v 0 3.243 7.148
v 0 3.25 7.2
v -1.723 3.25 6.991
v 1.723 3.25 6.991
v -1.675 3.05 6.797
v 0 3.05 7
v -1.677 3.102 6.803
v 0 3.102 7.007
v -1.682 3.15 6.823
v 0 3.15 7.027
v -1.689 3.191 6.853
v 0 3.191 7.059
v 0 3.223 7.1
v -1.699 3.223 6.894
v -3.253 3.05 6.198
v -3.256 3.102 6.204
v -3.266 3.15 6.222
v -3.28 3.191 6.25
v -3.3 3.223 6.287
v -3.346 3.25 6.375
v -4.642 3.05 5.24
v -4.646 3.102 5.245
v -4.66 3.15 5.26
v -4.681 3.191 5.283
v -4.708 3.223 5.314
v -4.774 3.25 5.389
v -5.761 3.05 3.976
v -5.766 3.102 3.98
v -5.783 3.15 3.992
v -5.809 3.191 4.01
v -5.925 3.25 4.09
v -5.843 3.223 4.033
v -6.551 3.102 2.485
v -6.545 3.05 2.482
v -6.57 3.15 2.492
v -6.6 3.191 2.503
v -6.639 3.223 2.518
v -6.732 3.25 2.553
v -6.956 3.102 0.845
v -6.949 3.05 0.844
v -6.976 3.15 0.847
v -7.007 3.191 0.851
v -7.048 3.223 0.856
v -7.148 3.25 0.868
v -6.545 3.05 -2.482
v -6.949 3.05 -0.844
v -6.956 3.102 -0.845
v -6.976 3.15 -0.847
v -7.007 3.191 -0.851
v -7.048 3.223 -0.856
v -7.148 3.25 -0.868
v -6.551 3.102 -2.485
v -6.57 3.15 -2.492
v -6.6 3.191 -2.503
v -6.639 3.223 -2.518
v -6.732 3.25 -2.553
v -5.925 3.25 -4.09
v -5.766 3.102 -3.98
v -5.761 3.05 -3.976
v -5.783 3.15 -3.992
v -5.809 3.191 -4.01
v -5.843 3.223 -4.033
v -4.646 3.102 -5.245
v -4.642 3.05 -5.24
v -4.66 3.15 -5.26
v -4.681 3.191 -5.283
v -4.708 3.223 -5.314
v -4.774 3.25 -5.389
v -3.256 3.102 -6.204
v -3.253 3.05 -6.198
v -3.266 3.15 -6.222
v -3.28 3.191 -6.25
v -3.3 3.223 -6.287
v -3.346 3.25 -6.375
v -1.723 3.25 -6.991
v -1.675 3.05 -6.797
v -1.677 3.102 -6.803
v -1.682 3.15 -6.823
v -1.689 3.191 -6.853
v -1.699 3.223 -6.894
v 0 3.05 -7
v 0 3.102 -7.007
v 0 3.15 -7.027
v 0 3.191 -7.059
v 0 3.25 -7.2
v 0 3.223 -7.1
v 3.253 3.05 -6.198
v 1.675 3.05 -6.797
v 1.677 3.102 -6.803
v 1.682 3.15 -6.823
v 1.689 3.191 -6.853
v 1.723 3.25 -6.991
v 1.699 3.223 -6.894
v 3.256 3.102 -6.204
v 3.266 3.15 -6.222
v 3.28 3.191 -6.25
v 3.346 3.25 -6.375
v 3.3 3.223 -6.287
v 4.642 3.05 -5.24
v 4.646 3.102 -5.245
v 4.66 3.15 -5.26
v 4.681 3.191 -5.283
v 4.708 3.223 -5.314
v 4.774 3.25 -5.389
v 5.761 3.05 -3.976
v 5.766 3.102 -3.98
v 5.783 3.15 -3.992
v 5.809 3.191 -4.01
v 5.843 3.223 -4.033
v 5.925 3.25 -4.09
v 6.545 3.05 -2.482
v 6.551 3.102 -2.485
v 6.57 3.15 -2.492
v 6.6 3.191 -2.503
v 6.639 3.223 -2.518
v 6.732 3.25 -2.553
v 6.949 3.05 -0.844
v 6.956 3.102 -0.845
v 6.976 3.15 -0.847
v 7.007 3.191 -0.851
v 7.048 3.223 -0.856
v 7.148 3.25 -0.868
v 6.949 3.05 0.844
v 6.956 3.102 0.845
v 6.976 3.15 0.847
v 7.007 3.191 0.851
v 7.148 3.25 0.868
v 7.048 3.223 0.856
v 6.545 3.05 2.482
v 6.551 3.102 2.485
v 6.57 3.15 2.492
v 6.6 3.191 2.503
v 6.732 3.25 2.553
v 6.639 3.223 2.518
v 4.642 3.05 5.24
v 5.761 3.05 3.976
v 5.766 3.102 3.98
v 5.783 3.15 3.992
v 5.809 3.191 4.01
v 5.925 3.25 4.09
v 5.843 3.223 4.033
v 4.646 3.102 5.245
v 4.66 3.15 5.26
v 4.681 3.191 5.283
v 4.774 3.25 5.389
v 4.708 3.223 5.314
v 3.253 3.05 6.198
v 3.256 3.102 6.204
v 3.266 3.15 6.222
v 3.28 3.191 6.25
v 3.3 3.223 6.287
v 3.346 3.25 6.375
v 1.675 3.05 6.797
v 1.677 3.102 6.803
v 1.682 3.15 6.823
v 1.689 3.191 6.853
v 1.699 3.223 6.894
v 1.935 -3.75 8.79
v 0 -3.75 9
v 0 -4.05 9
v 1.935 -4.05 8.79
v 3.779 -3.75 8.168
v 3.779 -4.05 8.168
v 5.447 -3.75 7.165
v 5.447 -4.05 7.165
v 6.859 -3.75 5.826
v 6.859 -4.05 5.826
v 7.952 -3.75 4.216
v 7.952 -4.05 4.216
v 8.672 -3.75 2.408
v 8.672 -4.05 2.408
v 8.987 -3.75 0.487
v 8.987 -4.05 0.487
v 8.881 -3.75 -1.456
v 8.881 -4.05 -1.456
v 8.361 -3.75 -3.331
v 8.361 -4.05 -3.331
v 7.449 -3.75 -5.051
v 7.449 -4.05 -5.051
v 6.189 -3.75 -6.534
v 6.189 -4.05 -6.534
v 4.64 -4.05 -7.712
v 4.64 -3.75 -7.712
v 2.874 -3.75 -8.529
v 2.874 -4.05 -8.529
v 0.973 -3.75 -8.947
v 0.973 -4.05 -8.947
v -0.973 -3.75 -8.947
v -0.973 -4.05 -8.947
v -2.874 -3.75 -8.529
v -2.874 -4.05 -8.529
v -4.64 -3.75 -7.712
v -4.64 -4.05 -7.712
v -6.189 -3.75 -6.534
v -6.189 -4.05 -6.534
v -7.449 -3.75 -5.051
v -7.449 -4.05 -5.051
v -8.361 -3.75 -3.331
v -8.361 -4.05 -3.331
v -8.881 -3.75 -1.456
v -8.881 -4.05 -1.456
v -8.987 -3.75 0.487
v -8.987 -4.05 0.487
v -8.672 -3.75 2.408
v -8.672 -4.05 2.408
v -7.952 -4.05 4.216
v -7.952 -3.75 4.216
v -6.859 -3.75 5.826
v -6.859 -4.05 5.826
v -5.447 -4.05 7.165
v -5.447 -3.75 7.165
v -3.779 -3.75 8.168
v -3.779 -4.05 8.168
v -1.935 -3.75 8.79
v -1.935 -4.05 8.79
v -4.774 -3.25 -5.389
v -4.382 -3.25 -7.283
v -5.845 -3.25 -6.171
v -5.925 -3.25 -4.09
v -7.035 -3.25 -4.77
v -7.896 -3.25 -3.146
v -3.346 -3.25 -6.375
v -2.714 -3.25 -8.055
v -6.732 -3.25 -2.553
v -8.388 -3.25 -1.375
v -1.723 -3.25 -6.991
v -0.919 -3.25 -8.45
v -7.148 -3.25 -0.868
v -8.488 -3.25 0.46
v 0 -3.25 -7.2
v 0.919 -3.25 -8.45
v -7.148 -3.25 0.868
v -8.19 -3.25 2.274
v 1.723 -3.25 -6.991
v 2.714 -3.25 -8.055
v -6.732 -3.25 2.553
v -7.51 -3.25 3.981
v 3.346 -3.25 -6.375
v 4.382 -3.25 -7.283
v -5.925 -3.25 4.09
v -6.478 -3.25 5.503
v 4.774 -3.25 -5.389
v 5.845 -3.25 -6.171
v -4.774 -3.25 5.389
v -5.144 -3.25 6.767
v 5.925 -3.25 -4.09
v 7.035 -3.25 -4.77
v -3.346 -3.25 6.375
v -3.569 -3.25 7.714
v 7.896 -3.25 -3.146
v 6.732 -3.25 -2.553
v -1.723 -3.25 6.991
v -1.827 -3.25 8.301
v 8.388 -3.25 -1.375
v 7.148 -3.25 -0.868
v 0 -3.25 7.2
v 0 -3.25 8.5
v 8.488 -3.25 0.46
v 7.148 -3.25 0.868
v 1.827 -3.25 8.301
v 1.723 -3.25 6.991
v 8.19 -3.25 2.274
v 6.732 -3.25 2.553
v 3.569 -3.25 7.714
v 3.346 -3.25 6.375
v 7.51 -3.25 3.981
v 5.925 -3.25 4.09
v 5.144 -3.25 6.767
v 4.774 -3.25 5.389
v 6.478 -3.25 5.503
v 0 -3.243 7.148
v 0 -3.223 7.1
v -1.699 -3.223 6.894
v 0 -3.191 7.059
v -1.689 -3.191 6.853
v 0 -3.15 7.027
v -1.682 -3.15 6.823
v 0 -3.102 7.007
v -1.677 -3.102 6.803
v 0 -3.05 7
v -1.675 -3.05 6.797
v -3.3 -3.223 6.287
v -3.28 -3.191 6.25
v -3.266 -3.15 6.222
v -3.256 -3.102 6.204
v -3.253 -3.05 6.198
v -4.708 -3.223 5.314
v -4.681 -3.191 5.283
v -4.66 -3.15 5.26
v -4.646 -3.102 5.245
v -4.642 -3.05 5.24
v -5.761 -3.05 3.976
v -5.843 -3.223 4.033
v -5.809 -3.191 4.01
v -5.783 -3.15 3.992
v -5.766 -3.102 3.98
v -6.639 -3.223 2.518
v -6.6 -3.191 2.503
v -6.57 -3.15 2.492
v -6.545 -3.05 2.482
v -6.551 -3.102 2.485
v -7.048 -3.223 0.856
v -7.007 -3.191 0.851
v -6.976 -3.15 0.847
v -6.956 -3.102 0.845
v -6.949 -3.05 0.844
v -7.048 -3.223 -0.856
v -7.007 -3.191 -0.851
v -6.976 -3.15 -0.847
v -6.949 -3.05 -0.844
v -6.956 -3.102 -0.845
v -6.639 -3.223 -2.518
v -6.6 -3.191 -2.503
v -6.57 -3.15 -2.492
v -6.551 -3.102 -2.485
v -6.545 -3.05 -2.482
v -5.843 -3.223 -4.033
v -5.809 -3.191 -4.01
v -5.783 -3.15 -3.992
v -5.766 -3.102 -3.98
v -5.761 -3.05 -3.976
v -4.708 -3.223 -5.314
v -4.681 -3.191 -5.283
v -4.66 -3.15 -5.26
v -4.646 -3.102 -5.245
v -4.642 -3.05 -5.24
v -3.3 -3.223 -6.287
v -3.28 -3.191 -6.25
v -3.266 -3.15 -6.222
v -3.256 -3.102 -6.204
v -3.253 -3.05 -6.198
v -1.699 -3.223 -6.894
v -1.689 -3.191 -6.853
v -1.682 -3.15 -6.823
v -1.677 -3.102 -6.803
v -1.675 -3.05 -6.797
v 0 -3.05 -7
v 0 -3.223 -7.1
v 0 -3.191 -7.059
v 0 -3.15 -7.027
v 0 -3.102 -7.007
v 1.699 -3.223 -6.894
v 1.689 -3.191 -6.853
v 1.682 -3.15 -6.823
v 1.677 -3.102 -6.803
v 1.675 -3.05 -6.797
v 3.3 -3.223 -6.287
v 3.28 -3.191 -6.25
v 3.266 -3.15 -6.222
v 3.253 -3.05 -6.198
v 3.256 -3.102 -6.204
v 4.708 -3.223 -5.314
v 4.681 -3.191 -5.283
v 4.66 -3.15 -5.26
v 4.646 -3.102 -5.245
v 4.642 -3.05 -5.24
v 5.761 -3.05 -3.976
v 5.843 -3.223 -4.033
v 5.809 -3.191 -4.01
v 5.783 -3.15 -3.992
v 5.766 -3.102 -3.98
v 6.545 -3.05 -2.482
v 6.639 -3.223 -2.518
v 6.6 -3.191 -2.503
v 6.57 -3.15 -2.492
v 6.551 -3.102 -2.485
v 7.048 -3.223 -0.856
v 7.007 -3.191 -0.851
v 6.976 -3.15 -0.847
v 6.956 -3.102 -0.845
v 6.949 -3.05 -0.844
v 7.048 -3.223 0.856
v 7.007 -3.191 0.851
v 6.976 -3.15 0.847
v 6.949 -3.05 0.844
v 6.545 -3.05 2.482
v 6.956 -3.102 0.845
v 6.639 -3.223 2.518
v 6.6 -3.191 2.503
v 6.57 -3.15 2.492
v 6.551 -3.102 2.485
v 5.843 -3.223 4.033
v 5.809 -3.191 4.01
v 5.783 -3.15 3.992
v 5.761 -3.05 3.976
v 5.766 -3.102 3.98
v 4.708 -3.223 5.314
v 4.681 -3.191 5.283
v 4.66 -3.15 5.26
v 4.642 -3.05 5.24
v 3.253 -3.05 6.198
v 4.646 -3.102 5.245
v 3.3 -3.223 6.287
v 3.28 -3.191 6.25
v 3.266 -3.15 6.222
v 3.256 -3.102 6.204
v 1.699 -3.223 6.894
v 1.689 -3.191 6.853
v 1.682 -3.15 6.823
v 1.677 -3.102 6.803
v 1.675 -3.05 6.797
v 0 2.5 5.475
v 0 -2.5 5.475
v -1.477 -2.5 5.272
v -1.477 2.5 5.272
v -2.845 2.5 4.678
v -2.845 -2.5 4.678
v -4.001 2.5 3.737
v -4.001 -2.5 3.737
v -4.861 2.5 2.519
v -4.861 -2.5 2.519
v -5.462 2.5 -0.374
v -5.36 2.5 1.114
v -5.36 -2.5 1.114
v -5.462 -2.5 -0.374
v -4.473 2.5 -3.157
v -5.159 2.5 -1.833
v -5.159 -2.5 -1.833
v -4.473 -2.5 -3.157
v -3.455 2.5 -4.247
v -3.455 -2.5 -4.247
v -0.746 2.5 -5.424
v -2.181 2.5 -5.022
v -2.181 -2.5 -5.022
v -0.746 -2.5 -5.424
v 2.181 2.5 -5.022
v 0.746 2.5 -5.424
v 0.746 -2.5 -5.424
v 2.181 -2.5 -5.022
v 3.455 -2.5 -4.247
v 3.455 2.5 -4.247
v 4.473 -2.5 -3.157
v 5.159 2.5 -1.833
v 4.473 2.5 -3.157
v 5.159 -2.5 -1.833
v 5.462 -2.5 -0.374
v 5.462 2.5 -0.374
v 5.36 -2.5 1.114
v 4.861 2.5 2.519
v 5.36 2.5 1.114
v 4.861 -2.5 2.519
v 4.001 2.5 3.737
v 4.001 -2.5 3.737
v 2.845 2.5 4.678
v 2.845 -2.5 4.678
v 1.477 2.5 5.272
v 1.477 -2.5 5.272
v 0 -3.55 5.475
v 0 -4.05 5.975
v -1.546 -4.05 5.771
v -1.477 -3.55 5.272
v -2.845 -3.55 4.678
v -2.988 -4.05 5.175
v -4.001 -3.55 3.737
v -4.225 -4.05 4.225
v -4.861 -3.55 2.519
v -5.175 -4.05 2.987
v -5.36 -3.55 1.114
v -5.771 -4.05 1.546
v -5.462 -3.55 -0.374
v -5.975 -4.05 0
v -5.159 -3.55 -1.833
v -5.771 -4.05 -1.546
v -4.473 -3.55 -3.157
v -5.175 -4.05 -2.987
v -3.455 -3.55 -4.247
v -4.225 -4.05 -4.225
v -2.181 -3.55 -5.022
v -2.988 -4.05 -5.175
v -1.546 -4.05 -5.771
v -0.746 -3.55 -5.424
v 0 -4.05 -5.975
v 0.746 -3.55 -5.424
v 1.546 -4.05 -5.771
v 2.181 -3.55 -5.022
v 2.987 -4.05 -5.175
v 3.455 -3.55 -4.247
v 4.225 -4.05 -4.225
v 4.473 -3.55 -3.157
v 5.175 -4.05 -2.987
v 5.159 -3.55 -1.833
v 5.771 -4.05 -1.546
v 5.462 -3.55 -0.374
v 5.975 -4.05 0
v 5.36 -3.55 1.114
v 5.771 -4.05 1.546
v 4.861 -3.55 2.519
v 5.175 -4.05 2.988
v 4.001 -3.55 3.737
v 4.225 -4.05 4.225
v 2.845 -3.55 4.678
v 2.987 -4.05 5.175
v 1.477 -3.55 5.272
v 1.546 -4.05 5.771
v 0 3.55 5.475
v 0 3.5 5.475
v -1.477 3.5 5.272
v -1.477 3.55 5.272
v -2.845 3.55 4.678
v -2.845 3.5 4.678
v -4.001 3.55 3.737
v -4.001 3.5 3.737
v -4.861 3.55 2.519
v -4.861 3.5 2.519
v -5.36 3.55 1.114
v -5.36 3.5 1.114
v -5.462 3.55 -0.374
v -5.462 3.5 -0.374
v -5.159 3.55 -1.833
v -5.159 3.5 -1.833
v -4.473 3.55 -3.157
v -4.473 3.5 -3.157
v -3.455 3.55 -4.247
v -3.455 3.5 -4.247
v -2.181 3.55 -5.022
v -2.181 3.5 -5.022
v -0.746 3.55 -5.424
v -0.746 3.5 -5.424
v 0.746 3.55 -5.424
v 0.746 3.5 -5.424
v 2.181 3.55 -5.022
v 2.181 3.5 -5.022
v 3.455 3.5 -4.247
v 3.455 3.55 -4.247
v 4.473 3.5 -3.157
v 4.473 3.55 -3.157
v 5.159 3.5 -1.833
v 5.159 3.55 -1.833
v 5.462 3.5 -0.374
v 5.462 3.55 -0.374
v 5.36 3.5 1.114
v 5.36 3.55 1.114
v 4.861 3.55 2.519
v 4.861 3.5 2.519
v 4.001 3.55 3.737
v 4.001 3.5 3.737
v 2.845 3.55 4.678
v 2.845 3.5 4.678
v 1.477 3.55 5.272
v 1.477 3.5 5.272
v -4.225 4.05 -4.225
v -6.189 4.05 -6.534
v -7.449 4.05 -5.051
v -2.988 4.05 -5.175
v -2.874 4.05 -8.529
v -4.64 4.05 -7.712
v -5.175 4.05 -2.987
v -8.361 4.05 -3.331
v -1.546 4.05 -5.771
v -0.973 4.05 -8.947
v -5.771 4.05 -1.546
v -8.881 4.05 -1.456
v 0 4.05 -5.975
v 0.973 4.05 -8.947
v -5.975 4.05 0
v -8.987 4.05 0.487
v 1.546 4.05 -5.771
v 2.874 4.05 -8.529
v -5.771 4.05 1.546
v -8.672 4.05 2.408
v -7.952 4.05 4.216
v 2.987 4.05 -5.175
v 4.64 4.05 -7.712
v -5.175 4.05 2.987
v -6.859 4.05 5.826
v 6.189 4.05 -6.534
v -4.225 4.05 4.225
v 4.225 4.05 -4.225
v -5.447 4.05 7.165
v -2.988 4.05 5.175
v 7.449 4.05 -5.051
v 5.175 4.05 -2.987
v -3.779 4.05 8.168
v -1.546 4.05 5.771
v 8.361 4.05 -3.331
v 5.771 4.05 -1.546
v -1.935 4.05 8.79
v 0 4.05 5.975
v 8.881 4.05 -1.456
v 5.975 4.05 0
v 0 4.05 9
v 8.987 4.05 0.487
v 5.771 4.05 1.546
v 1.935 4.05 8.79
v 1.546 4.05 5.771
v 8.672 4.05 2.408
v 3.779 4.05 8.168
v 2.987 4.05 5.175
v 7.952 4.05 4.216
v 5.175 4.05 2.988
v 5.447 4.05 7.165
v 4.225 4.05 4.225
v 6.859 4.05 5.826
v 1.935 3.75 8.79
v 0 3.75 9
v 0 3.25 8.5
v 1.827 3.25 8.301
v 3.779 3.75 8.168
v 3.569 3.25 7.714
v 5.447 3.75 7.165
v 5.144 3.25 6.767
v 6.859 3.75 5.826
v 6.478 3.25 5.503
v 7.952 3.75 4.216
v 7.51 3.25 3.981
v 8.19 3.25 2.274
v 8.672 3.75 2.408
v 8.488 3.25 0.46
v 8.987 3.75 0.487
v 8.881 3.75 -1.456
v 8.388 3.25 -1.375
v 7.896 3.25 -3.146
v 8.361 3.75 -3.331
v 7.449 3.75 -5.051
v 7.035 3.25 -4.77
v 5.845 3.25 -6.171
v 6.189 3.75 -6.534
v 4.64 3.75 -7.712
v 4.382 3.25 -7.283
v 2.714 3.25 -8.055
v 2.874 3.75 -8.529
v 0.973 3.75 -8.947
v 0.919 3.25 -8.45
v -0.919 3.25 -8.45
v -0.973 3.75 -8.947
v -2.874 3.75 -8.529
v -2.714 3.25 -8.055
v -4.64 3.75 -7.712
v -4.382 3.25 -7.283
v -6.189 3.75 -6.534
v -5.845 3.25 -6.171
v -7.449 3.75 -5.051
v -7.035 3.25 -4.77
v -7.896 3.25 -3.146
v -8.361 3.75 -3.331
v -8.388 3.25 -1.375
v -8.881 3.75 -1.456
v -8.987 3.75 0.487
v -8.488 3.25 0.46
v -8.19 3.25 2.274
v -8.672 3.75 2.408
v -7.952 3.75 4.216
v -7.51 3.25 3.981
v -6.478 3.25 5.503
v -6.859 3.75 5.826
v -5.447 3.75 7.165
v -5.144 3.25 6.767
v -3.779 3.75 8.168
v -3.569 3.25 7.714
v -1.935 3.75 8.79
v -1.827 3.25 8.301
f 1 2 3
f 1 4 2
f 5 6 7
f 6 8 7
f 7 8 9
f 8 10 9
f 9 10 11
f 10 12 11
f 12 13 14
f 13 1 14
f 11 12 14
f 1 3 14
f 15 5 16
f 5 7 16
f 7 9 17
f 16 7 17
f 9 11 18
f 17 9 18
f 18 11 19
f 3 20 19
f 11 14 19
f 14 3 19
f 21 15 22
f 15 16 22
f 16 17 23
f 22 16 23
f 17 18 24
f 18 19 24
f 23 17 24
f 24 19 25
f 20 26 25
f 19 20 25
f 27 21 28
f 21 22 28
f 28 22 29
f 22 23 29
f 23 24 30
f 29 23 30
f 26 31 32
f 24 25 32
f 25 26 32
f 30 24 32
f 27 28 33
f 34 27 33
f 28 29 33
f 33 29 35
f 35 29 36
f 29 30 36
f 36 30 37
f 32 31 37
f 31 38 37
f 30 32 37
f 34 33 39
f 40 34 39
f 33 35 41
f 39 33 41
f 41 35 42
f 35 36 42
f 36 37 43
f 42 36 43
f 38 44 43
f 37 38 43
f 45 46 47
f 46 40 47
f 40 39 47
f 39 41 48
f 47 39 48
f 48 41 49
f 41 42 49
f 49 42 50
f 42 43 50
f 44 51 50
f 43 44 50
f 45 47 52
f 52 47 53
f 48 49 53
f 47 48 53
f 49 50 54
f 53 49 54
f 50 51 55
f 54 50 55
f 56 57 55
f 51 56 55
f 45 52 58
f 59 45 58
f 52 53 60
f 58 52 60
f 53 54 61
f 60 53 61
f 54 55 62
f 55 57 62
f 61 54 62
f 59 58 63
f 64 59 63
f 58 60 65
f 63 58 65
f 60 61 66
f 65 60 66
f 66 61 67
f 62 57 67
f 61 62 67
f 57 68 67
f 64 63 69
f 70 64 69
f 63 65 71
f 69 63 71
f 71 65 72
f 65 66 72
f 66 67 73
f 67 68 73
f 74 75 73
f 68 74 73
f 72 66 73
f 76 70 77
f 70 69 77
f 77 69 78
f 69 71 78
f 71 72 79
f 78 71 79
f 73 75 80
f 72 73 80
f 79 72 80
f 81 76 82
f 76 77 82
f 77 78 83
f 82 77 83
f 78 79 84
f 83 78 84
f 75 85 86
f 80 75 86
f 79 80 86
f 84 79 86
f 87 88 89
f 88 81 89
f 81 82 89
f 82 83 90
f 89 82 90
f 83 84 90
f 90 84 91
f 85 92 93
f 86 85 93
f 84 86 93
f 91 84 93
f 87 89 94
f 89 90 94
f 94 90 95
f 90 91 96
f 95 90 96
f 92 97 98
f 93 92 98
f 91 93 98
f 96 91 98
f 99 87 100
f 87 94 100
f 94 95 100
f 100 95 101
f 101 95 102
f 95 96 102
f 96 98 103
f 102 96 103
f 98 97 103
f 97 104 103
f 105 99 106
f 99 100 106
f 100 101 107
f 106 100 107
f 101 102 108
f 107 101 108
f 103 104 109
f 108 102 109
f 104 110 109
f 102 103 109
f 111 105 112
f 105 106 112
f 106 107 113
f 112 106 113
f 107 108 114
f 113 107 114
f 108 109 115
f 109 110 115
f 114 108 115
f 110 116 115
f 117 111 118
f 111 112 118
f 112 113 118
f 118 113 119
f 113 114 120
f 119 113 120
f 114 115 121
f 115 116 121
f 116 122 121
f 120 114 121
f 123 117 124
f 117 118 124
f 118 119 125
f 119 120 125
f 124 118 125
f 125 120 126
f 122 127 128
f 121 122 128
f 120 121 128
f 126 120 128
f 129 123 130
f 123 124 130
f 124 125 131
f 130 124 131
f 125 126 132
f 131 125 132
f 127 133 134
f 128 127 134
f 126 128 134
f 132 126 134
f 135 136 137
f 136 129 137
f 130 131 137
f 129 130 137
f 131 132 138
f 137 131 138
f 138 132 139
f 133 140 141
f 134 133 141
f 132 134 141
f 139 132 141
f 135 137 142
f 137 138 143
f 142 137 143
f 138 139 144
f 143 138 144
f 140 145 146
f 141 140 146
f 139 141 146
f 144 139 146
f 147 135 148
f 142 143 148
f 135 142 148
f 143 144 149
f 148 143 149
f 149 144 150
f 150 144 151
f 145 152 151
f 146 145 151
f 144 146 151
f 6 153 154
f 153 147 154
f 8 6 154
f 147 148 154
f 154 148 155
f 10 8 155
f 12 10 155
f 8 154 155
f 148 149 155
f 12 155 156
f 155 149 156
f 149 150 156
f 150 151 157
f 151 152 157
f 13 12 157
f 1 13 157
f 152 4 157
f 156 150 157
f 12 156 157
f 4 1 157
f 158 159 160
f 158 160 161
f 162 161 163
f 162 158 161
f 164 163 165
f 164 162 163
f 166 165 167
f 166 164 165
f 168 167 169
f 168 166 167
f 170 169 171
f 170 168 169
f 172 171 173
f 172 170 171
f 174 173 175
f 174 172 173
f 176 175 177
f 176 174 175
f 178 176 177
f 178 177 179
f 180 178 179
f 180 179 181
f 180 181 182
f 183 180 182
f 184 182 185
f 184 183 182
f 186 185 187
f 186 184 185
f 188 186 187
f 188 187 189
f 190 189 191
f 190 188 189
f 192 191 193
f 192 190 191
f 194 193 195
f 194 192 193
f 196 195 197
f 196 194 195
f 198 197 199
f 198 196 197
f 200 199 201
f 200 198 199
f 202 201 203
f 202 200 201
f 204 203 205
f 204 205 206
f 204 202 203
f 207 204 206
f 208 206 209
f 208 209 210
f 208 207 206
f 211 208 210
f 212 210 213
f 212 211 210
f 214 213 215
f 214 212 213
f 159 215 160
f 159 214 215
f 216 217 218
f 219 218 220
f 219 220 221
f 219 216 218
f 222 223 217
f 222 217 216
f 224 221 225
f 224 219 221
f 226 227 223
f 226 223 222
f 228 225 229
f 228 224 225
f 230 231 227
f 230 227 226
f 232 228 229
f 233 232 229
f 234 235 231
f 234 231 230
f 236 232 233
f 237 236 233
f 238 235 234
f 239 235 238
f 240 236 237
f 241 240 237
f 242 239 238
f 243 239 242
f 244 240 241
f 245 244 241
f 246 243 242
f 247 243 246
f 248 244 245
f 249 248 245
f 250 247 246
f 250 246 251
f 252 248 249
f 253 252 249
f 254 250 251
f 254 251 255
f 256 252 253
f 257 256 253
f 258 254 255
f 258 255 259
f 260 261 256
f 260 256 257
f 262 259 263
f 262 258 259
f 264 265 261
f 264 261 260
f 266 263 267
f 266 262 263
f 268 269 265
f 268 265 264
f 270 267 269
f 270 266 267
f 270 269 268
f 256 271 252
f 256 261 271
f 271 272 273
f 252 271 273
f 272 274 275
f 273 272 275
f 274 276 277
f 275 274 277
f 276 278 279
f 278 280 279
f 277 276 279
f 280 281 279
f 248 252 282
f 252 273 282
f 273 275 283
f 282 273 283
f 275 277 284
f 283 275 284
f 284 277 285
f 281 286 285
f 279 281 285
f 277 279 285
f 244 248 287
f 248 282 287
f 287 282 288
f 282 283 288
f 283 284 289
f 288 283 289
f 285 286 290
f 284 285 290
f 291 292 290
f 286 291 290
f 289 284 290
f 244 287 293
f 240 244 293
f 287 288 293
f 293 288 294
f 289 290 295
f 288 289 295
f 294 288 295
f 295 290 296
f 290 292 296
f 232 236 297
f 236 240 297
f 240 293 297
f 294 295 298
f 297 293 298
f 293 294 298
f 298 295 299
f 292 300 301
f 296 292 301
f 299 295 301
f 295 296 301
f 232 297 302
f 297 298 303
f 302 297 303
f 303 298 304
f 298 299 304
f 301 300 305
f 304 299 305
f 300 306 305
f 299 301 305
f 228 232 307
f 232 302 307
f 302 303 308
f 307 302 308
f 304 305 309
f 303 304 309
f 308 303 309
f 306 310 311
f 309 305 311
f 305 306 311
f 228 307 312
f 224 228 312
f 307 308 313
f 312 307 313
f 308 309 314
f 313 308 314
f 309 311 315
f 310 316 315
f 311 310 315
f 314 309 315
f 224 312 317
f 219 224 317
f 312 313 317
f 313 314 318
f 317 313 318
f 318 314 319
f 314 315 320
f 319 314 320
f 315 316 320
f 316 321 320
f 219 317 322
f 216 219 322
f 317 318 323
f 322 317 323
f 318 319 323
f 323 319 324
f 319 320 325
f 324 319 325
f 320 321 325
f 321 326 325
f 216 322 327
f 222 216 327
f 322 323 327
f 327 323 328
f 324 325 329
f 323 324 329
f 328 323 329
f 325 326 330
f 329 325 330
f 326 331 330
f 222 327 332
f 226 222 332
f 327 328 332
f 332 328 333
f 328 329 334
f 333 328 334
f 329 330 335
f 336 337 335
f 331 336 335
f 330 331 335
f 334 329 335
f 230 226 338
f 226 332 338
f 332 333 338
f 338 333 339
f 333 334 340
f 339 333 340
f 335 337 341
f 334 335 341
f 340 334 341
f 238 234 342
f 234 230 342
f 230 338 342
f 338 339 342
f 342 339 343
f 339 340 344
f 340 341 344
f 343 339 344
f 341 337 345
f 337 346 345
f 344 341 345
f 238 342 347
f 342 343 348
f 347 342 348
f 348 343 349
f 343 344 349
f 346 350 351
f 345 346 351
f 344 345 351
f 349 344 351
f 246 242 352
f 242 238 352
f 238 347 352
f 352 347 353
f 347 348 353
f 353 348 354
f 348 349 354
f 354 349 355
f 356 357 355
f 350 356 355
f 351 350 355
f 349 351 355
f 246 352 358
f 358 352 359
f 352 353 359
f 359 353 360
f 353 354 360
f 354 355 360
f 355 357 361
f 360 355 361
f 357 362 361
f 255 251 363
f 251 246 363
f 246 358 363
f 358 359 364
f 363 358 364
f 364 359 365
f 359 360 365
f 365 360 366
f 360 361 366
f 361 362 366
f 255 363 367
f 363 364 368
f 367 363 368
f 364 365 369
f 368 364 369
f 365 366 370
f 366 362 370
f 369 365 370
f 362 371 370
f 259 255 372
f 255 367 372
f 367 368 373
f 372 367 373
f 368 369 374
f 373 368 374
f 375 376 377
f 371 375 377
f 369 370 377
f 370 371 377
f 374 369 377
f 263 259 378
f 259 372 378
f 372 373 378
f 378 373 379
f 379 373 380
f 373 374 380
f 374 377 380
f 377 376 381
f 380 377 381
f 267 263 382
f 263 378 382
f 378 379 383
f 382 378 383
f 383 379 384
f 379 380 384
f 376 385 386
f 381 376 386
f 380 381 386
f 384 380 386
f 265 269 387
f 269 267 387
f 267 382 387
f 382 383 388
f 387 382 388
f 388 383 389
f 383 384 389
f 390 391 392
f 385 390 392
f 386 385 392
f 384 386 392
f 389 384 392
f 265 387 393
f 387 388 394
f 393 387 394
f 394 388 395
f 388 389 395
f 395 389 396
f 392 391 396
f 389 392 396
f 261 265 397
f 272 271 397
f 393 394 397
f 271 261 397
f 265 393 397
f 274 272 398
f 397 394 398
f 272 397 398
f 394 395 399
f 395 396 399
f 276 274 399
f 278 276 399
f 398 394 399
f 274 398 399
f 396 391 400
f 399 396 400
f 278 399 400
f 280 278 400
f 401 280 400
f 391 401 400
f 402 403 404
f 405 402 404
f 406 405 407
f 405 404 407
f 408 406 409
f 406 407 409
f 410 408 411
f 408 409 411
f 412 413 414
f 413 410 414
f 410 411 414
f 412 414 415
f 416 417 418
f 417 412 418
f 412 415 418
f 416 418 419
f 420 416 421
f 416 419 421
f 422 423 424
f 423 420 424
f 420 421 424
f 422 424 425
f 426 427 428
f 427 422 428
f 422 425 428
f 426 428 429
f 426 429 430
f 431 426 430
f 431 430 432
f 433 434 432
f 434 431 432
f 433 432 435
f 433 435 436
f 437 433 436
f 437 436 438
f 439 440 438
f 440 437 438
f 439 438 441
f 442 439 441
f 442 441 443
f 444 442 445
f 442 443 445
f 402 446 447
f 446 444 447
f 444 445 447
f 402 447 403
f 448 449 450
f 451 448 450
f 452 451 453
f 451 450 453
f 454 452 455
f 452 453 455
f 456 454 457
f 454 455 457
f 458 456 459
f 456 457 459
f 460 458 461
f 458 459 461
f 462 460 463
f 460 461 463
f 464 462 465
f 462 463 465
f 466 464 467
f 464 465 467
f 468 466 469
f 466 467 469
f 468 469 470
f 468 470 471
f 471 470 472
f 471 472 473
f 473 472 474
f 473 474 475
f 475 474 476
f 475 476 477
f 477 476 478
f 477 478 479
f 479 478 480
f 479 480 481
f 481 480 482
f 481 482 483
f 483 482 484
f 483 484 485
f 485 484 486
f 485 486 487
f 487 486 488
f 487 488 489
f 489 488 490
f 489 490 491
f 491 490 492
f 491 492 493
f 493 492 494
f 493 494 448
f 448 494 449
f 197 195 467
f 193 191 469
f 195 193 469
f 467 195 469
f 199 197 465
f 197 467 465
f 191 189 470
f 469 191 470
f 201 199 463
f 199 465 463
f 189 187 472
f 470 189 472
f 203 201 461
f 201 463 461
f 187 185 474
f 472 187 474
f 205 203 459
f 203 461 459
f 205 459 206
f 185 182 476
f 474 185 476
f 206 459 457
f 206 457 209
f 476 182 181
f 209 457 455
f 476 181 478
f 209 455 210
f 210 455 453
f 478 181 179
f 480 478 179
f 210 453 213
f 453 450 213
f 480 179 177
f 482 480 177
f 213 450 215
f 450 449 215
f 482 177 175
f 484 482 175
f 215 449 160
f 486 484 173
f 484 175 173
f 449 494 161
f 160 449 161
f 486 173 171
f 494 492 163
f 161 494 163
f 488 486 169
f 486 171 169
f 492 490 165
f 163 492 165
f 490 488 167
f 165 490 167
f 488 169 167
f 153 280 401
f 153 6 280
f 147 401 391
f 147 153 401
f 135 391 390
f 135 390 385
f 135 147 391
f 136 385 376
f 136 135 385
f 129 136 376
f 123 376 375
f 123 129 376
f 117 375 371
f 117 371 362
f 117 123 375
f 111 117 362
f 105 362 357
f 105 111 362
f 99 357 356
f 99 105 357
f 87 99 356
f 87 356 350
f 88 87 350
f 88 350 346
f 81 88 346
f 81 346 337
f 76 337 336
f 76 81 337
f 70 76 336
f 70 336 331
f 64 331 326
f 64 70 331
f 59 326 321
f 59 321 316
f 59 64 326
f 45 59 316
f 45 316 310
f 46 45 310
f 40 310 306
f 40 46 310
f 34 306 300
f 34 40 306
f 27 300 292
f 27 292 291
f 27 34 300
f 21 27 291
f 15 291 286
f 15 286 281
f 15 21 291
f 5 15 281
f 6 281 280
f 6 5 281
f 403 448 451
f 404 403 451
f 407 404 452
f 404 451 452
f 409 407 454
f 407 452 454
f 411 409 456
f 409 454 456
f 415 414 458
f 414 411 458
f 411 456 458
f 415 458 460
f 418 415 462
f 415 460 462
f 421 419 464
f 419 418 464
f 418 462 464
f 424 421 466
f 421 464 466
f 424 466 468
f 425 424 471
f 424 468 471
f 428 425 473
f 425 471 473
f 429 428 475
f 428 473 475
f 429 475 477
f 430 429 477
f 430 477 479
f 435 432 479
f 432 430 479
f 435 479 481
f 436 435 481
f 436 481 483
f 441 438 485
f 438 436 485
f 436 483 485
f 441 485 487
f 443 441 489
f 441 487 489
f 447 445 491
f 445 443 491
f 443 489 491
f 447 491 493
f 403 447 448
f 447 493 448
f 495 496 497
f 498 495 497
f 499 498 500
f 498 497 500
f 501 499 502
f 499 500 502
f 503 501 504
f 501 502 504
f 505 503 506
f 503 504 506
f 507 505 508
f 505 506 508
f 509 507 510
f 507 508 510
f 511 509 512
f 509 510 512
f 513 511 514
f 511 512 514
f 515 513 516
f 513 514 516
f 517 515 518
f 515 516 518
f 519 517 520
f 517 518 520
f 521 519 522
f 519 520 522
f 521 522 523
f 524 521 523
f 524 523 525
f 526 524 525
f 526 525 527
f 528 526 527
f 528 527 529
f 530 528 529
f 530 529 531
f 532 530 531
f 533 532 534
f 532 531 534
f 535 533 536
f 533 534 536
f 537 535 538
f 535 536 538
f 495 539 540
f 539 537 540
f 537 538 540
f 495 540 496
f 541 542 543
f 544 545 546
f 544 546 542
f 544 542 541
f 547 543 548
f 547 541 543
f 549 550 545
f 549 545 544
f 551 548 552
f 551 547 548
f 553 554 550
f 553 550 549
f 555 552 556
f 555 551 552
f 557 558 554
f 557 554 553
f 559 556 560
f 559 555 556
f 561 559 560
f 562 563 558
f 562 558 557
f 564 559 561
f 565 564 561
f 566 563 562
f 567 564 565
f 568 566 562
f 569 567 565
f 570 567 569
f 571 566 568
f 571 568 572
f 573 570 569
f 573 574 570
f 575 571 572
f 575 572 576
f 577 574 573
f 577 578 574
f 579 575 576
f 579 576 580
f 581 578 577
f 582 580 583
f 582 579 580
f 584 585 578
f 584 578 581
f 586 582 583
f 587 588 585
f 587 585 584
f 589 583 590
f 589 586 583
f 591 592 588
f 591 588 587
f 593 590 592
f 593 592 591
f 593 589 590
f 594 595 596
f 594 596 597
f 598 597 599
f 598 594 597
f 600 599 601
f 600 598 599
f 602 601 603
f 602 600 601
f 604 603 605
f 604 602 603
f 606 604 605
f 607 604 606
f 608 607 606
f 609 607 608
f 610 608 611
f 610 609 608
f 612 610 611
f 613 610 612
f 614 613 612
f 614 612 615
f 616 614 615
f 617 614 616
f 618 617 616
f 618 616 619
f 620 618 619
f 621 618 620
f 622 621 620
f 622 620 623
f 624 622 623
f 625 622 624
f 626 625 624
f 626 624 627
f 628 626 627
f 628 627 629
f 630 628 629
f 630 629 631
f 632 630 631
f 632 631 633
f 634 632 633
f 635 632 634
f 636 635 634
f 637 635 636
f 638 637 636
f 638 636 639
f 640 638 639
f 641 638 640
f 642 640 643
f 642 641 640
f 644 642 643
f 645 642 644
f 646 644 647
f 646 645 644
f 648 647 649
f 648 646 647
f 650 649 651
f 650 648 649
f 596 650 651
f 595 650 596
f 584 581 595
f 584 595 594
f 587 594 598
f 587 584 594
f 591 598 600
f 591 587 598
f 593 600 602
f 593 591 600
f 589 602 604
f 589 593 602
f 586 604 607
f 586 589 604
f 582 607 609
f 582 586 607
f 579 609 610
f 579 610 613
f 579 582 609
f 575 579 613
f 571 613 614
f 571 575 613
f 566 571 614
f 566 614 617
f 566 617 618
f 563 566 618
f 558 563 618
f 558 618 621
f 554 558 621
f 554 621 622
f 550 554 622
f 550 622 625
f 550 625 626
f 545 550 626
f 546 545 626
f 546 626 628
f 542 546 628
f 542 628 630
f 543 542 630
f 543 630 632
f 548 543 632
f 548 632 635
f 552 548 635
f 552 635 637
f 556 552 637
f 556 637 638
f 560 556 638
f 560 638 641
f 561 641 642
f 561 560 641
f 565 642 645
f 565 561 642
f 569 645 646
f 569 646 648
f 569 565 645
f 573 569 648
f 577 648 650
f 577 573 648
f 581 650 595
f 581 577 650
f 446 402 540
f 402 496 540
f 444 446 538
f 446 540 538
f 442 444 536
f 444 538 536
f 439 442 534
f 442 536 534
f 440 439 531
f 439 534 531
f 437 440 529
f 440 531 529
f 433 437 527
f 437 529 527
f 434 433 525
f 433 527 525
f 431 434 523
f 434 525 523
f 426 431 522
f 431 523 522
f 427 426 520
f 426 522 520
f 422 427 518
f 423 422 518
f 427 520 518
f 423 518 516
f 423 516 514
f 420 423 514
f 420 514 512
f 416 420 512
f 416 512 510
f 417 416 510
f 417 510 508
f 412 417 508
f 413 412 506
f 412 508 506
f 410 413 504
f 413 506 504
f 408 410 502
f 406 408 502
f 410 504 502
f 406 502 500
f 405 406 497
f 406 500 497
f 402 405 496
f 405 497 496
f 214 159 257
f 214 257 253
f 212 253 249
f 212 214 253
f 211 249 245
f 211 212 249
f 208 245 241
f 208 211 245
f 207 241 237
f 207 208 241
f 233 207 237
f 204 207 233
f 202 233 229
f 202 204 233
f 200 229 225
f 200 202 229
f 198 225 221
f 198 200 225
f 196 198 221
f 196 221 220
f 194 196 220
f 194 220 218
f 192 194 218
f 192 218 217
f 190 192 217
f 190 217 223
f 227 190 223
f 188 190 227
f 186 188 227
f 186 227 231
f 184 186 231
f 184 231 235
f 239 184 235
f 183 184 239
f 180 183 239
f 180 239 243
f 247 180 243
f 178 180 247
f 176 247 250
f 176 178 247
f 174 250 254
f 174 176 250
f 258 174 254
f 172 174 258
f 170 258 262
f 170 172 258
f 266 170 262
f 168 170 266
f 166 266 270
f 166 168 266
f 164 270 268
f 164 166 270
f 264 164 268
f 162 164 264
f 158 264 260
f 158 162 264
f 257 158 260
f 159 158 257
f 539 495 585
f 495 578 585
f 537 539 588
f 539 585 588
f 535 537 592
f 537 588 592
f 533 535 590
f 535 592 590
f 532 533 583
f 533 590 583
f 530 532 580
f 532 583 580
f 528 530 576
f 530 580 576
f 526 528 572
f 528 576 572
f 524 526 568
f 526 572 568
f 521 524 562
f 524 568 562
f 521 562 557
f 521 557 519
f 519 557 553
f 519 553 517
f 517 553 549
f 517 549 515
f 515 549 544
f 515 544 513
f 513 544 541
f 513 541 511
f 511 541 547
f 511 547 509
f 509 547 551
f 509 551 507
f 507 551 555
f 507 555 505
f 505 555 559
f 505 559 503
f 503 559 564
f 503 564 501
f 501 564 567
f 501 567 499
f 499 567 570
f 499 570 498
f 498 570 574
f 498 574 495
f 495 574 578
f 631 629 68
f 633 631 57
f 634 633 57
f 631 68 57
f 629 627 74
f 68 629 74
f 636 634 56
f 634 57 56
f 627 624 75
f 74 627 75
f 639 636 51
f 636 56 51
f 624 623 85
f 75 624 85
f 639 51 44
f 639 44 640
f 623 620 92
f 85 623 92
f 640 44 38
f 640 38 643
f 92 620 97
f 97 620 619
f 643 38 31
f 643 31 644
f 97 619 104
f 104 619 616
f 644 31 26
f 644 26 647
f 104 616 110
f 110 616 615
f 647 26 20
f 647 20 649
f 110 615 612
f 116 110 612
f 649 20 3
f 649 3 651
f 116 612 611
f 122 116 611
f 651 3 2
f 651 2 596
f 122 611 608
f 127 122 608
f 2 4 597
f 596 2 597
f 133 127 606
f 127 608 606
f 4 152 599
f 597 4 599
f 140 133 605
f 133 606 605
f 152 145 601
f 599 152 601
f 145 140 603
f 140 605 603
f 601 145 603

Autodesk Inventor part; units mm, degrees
ref_plane "YZ Plane" through (0, 0, 0) normal (1, 0, 0) x (0, 1, 0)
ref_plane "XZ Plane" through (0, 0, 0) normal (0, 1, 0) x (-1, 0, 0)
ref_plane "XY Plane" through (0, 0, 0) normal (0, 0, 1) x (1, 0, 0)
sketch "Esboço1" plane through (0, 0, 0) normal (1, 0, 0) x (0, 1, 0)
  line L0 (-4.05, 9) -> (-3.25, 9)
  line L1 (-3.25, 9) -> (-3.25, 7)
  line L2 (-3.25, 7) -> (3.25, 7)
  line L3 (3.25, 7) -> (3.25, 9)
  line L4 (3.25, 9) -> (4.05, 9)
  line L5 (4.05, 9) -> (4.05, 5.475)
  line L6 (-2.5, 5.475) -> (-4.05, 5.475)
  line L7 (-4.05, 5.475) -> (-4.05, 9)
  line L8 (-21.75, 0) -> (21.75, 0)
  line L9 (-2.5, 5.475) -> (-2.5, 5.475)
  line L10 (2.5, 5.475) -> (2.5, 5.475)
  line L11 (2.5, 5.475) -> (3.5, 5.475)
  line L12 (3.5, 5.475) -> (3.5, 5.475)
  line L13 (4.05, 5.475) -> (3.5, 5.475)
  line L14 (2.5, 5.475) -> (-2.5, 5.475)
  point P0 (0, 0)
  point P1 (0, 0)
  point P2 (0, 5.475)
  point P3 (0, 7)
  dimension "d3" = 0.8
  dimension "d4" = 14
  dimension "d5" = 18
  dimension "d11" = 2.5
  dimension "d14" = 10.95
  dimension "d16" = 6.5
  dimension "d17" = 2.5
  dimension "d19" = 10.95
  dimension "d20" = 125
  dimension "d21" = 0
  dimension "d22" = 1
revolve "Revolução1" add sketch "Esboço1" angle 360 about axis through (0, -21.75, 0) along (0, 1, 0)
fillet "Arredondamento1" radius 0.2 2 edges at (0, 3.25, -7) (0, -3.25, -7)
chamfer "Chamfer2" distance 0.5 angle 45 2 edges at (0, -3.25, -9) (0, 3.25, -9)
chamfer "Chamfer3" distance 0.5 angle 45 2 edges at (0, -4.05, -5.475) (0, 4.05, -5.475)
properties part number "PoliaLisaGT2" material "Aluminum 6061"
